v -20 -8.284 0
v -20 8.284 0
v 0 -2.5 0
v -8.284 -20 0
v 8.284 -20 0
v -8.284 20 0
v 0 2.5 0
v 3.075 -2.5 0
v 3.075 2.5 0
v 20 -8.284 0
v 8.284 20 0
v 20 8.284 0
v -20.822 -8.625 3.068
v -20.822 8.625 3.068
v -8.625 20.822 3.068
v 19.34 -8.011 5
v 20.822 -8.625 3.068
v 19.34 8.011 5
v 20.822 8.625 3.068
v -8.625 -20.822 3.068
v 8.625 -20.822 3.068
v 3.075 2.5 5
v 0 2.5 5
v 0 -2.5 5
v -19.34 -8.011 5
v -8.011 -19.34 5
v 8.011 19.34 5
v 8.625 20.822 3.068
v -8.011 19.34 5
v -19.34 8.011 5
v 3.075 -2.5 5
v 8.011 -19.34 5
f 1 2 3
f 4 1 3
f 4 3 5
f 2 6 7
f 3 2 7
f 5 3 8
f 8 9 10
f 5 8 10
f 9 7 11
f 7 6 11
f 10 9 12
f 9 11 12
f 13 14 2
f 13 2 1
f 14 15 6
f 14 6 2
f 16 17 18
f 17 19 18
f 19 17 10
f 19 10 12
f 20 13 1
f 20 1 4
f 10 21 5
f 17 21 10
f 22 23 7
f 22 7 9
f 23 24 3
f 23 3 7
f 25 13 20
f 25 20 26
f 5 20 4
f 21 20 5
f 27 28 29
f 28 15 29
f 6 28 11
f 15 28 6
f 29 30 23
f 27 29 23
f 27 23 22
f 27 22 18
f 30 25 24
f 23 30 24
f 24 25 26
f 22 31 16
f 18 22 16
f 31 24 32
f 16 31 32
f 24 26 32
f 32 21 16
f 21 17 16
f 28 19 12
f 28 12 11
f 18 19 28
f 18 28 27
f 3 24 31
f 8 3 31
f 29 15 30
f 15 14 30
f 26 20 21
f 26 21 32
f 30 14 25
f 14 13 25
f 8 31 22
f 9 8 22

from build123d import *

# Parameters (mm, degrees)
F1_DEPTH = 5
F1_TAPER = -15
F2_SIZE  = 2
F3_W     = 3.075
F3_H     = 5
F4_DEPTH = 5


with BuildPart() as f1:
    # F0 (on Top) → F1 (new body)
    with BuildSketch(Plane.XY):
        Polygon((-20, 8.2842712475), (-20, -8.2842712475), (-8.2842712475, -20), (8.2842712475, -20), (20, -8.2842712475), (20, 8.2842712475), (8.2842712475, 20), (-8.2842712475, 20), align=None)
    extrude(amount=F1_DEPTH, taper=F1_TAPER)

    # F2
    f2_edges = [f1.edges().sort_by_distance(p)[0] for p in [
        (-15.089479, -15.089479, 5),
        (0, -21.339746, 5),
        (15.089479, -15.089479, 5),
        (-21.339746, 0, 5),
        (-15.089479, 15.089479, 5),
        (21.339746, 0, 5),
        (15.089479, 15.089479, 5),
        (0, 21.339746, 5),
    ]]
    chamfer(f2_edges, length=F2_SIZE)

    # F3 (on face) → F4 (cut)
    with BuildSketch(Plane.XY.offset(5)):
        with Locations((1.5375, 0)):
            Rectangle(F3_W, F3_H)
    extrude(amount=-F4_DEPTH, mode=Mode.SUBTRACT)


solid = f1.part
